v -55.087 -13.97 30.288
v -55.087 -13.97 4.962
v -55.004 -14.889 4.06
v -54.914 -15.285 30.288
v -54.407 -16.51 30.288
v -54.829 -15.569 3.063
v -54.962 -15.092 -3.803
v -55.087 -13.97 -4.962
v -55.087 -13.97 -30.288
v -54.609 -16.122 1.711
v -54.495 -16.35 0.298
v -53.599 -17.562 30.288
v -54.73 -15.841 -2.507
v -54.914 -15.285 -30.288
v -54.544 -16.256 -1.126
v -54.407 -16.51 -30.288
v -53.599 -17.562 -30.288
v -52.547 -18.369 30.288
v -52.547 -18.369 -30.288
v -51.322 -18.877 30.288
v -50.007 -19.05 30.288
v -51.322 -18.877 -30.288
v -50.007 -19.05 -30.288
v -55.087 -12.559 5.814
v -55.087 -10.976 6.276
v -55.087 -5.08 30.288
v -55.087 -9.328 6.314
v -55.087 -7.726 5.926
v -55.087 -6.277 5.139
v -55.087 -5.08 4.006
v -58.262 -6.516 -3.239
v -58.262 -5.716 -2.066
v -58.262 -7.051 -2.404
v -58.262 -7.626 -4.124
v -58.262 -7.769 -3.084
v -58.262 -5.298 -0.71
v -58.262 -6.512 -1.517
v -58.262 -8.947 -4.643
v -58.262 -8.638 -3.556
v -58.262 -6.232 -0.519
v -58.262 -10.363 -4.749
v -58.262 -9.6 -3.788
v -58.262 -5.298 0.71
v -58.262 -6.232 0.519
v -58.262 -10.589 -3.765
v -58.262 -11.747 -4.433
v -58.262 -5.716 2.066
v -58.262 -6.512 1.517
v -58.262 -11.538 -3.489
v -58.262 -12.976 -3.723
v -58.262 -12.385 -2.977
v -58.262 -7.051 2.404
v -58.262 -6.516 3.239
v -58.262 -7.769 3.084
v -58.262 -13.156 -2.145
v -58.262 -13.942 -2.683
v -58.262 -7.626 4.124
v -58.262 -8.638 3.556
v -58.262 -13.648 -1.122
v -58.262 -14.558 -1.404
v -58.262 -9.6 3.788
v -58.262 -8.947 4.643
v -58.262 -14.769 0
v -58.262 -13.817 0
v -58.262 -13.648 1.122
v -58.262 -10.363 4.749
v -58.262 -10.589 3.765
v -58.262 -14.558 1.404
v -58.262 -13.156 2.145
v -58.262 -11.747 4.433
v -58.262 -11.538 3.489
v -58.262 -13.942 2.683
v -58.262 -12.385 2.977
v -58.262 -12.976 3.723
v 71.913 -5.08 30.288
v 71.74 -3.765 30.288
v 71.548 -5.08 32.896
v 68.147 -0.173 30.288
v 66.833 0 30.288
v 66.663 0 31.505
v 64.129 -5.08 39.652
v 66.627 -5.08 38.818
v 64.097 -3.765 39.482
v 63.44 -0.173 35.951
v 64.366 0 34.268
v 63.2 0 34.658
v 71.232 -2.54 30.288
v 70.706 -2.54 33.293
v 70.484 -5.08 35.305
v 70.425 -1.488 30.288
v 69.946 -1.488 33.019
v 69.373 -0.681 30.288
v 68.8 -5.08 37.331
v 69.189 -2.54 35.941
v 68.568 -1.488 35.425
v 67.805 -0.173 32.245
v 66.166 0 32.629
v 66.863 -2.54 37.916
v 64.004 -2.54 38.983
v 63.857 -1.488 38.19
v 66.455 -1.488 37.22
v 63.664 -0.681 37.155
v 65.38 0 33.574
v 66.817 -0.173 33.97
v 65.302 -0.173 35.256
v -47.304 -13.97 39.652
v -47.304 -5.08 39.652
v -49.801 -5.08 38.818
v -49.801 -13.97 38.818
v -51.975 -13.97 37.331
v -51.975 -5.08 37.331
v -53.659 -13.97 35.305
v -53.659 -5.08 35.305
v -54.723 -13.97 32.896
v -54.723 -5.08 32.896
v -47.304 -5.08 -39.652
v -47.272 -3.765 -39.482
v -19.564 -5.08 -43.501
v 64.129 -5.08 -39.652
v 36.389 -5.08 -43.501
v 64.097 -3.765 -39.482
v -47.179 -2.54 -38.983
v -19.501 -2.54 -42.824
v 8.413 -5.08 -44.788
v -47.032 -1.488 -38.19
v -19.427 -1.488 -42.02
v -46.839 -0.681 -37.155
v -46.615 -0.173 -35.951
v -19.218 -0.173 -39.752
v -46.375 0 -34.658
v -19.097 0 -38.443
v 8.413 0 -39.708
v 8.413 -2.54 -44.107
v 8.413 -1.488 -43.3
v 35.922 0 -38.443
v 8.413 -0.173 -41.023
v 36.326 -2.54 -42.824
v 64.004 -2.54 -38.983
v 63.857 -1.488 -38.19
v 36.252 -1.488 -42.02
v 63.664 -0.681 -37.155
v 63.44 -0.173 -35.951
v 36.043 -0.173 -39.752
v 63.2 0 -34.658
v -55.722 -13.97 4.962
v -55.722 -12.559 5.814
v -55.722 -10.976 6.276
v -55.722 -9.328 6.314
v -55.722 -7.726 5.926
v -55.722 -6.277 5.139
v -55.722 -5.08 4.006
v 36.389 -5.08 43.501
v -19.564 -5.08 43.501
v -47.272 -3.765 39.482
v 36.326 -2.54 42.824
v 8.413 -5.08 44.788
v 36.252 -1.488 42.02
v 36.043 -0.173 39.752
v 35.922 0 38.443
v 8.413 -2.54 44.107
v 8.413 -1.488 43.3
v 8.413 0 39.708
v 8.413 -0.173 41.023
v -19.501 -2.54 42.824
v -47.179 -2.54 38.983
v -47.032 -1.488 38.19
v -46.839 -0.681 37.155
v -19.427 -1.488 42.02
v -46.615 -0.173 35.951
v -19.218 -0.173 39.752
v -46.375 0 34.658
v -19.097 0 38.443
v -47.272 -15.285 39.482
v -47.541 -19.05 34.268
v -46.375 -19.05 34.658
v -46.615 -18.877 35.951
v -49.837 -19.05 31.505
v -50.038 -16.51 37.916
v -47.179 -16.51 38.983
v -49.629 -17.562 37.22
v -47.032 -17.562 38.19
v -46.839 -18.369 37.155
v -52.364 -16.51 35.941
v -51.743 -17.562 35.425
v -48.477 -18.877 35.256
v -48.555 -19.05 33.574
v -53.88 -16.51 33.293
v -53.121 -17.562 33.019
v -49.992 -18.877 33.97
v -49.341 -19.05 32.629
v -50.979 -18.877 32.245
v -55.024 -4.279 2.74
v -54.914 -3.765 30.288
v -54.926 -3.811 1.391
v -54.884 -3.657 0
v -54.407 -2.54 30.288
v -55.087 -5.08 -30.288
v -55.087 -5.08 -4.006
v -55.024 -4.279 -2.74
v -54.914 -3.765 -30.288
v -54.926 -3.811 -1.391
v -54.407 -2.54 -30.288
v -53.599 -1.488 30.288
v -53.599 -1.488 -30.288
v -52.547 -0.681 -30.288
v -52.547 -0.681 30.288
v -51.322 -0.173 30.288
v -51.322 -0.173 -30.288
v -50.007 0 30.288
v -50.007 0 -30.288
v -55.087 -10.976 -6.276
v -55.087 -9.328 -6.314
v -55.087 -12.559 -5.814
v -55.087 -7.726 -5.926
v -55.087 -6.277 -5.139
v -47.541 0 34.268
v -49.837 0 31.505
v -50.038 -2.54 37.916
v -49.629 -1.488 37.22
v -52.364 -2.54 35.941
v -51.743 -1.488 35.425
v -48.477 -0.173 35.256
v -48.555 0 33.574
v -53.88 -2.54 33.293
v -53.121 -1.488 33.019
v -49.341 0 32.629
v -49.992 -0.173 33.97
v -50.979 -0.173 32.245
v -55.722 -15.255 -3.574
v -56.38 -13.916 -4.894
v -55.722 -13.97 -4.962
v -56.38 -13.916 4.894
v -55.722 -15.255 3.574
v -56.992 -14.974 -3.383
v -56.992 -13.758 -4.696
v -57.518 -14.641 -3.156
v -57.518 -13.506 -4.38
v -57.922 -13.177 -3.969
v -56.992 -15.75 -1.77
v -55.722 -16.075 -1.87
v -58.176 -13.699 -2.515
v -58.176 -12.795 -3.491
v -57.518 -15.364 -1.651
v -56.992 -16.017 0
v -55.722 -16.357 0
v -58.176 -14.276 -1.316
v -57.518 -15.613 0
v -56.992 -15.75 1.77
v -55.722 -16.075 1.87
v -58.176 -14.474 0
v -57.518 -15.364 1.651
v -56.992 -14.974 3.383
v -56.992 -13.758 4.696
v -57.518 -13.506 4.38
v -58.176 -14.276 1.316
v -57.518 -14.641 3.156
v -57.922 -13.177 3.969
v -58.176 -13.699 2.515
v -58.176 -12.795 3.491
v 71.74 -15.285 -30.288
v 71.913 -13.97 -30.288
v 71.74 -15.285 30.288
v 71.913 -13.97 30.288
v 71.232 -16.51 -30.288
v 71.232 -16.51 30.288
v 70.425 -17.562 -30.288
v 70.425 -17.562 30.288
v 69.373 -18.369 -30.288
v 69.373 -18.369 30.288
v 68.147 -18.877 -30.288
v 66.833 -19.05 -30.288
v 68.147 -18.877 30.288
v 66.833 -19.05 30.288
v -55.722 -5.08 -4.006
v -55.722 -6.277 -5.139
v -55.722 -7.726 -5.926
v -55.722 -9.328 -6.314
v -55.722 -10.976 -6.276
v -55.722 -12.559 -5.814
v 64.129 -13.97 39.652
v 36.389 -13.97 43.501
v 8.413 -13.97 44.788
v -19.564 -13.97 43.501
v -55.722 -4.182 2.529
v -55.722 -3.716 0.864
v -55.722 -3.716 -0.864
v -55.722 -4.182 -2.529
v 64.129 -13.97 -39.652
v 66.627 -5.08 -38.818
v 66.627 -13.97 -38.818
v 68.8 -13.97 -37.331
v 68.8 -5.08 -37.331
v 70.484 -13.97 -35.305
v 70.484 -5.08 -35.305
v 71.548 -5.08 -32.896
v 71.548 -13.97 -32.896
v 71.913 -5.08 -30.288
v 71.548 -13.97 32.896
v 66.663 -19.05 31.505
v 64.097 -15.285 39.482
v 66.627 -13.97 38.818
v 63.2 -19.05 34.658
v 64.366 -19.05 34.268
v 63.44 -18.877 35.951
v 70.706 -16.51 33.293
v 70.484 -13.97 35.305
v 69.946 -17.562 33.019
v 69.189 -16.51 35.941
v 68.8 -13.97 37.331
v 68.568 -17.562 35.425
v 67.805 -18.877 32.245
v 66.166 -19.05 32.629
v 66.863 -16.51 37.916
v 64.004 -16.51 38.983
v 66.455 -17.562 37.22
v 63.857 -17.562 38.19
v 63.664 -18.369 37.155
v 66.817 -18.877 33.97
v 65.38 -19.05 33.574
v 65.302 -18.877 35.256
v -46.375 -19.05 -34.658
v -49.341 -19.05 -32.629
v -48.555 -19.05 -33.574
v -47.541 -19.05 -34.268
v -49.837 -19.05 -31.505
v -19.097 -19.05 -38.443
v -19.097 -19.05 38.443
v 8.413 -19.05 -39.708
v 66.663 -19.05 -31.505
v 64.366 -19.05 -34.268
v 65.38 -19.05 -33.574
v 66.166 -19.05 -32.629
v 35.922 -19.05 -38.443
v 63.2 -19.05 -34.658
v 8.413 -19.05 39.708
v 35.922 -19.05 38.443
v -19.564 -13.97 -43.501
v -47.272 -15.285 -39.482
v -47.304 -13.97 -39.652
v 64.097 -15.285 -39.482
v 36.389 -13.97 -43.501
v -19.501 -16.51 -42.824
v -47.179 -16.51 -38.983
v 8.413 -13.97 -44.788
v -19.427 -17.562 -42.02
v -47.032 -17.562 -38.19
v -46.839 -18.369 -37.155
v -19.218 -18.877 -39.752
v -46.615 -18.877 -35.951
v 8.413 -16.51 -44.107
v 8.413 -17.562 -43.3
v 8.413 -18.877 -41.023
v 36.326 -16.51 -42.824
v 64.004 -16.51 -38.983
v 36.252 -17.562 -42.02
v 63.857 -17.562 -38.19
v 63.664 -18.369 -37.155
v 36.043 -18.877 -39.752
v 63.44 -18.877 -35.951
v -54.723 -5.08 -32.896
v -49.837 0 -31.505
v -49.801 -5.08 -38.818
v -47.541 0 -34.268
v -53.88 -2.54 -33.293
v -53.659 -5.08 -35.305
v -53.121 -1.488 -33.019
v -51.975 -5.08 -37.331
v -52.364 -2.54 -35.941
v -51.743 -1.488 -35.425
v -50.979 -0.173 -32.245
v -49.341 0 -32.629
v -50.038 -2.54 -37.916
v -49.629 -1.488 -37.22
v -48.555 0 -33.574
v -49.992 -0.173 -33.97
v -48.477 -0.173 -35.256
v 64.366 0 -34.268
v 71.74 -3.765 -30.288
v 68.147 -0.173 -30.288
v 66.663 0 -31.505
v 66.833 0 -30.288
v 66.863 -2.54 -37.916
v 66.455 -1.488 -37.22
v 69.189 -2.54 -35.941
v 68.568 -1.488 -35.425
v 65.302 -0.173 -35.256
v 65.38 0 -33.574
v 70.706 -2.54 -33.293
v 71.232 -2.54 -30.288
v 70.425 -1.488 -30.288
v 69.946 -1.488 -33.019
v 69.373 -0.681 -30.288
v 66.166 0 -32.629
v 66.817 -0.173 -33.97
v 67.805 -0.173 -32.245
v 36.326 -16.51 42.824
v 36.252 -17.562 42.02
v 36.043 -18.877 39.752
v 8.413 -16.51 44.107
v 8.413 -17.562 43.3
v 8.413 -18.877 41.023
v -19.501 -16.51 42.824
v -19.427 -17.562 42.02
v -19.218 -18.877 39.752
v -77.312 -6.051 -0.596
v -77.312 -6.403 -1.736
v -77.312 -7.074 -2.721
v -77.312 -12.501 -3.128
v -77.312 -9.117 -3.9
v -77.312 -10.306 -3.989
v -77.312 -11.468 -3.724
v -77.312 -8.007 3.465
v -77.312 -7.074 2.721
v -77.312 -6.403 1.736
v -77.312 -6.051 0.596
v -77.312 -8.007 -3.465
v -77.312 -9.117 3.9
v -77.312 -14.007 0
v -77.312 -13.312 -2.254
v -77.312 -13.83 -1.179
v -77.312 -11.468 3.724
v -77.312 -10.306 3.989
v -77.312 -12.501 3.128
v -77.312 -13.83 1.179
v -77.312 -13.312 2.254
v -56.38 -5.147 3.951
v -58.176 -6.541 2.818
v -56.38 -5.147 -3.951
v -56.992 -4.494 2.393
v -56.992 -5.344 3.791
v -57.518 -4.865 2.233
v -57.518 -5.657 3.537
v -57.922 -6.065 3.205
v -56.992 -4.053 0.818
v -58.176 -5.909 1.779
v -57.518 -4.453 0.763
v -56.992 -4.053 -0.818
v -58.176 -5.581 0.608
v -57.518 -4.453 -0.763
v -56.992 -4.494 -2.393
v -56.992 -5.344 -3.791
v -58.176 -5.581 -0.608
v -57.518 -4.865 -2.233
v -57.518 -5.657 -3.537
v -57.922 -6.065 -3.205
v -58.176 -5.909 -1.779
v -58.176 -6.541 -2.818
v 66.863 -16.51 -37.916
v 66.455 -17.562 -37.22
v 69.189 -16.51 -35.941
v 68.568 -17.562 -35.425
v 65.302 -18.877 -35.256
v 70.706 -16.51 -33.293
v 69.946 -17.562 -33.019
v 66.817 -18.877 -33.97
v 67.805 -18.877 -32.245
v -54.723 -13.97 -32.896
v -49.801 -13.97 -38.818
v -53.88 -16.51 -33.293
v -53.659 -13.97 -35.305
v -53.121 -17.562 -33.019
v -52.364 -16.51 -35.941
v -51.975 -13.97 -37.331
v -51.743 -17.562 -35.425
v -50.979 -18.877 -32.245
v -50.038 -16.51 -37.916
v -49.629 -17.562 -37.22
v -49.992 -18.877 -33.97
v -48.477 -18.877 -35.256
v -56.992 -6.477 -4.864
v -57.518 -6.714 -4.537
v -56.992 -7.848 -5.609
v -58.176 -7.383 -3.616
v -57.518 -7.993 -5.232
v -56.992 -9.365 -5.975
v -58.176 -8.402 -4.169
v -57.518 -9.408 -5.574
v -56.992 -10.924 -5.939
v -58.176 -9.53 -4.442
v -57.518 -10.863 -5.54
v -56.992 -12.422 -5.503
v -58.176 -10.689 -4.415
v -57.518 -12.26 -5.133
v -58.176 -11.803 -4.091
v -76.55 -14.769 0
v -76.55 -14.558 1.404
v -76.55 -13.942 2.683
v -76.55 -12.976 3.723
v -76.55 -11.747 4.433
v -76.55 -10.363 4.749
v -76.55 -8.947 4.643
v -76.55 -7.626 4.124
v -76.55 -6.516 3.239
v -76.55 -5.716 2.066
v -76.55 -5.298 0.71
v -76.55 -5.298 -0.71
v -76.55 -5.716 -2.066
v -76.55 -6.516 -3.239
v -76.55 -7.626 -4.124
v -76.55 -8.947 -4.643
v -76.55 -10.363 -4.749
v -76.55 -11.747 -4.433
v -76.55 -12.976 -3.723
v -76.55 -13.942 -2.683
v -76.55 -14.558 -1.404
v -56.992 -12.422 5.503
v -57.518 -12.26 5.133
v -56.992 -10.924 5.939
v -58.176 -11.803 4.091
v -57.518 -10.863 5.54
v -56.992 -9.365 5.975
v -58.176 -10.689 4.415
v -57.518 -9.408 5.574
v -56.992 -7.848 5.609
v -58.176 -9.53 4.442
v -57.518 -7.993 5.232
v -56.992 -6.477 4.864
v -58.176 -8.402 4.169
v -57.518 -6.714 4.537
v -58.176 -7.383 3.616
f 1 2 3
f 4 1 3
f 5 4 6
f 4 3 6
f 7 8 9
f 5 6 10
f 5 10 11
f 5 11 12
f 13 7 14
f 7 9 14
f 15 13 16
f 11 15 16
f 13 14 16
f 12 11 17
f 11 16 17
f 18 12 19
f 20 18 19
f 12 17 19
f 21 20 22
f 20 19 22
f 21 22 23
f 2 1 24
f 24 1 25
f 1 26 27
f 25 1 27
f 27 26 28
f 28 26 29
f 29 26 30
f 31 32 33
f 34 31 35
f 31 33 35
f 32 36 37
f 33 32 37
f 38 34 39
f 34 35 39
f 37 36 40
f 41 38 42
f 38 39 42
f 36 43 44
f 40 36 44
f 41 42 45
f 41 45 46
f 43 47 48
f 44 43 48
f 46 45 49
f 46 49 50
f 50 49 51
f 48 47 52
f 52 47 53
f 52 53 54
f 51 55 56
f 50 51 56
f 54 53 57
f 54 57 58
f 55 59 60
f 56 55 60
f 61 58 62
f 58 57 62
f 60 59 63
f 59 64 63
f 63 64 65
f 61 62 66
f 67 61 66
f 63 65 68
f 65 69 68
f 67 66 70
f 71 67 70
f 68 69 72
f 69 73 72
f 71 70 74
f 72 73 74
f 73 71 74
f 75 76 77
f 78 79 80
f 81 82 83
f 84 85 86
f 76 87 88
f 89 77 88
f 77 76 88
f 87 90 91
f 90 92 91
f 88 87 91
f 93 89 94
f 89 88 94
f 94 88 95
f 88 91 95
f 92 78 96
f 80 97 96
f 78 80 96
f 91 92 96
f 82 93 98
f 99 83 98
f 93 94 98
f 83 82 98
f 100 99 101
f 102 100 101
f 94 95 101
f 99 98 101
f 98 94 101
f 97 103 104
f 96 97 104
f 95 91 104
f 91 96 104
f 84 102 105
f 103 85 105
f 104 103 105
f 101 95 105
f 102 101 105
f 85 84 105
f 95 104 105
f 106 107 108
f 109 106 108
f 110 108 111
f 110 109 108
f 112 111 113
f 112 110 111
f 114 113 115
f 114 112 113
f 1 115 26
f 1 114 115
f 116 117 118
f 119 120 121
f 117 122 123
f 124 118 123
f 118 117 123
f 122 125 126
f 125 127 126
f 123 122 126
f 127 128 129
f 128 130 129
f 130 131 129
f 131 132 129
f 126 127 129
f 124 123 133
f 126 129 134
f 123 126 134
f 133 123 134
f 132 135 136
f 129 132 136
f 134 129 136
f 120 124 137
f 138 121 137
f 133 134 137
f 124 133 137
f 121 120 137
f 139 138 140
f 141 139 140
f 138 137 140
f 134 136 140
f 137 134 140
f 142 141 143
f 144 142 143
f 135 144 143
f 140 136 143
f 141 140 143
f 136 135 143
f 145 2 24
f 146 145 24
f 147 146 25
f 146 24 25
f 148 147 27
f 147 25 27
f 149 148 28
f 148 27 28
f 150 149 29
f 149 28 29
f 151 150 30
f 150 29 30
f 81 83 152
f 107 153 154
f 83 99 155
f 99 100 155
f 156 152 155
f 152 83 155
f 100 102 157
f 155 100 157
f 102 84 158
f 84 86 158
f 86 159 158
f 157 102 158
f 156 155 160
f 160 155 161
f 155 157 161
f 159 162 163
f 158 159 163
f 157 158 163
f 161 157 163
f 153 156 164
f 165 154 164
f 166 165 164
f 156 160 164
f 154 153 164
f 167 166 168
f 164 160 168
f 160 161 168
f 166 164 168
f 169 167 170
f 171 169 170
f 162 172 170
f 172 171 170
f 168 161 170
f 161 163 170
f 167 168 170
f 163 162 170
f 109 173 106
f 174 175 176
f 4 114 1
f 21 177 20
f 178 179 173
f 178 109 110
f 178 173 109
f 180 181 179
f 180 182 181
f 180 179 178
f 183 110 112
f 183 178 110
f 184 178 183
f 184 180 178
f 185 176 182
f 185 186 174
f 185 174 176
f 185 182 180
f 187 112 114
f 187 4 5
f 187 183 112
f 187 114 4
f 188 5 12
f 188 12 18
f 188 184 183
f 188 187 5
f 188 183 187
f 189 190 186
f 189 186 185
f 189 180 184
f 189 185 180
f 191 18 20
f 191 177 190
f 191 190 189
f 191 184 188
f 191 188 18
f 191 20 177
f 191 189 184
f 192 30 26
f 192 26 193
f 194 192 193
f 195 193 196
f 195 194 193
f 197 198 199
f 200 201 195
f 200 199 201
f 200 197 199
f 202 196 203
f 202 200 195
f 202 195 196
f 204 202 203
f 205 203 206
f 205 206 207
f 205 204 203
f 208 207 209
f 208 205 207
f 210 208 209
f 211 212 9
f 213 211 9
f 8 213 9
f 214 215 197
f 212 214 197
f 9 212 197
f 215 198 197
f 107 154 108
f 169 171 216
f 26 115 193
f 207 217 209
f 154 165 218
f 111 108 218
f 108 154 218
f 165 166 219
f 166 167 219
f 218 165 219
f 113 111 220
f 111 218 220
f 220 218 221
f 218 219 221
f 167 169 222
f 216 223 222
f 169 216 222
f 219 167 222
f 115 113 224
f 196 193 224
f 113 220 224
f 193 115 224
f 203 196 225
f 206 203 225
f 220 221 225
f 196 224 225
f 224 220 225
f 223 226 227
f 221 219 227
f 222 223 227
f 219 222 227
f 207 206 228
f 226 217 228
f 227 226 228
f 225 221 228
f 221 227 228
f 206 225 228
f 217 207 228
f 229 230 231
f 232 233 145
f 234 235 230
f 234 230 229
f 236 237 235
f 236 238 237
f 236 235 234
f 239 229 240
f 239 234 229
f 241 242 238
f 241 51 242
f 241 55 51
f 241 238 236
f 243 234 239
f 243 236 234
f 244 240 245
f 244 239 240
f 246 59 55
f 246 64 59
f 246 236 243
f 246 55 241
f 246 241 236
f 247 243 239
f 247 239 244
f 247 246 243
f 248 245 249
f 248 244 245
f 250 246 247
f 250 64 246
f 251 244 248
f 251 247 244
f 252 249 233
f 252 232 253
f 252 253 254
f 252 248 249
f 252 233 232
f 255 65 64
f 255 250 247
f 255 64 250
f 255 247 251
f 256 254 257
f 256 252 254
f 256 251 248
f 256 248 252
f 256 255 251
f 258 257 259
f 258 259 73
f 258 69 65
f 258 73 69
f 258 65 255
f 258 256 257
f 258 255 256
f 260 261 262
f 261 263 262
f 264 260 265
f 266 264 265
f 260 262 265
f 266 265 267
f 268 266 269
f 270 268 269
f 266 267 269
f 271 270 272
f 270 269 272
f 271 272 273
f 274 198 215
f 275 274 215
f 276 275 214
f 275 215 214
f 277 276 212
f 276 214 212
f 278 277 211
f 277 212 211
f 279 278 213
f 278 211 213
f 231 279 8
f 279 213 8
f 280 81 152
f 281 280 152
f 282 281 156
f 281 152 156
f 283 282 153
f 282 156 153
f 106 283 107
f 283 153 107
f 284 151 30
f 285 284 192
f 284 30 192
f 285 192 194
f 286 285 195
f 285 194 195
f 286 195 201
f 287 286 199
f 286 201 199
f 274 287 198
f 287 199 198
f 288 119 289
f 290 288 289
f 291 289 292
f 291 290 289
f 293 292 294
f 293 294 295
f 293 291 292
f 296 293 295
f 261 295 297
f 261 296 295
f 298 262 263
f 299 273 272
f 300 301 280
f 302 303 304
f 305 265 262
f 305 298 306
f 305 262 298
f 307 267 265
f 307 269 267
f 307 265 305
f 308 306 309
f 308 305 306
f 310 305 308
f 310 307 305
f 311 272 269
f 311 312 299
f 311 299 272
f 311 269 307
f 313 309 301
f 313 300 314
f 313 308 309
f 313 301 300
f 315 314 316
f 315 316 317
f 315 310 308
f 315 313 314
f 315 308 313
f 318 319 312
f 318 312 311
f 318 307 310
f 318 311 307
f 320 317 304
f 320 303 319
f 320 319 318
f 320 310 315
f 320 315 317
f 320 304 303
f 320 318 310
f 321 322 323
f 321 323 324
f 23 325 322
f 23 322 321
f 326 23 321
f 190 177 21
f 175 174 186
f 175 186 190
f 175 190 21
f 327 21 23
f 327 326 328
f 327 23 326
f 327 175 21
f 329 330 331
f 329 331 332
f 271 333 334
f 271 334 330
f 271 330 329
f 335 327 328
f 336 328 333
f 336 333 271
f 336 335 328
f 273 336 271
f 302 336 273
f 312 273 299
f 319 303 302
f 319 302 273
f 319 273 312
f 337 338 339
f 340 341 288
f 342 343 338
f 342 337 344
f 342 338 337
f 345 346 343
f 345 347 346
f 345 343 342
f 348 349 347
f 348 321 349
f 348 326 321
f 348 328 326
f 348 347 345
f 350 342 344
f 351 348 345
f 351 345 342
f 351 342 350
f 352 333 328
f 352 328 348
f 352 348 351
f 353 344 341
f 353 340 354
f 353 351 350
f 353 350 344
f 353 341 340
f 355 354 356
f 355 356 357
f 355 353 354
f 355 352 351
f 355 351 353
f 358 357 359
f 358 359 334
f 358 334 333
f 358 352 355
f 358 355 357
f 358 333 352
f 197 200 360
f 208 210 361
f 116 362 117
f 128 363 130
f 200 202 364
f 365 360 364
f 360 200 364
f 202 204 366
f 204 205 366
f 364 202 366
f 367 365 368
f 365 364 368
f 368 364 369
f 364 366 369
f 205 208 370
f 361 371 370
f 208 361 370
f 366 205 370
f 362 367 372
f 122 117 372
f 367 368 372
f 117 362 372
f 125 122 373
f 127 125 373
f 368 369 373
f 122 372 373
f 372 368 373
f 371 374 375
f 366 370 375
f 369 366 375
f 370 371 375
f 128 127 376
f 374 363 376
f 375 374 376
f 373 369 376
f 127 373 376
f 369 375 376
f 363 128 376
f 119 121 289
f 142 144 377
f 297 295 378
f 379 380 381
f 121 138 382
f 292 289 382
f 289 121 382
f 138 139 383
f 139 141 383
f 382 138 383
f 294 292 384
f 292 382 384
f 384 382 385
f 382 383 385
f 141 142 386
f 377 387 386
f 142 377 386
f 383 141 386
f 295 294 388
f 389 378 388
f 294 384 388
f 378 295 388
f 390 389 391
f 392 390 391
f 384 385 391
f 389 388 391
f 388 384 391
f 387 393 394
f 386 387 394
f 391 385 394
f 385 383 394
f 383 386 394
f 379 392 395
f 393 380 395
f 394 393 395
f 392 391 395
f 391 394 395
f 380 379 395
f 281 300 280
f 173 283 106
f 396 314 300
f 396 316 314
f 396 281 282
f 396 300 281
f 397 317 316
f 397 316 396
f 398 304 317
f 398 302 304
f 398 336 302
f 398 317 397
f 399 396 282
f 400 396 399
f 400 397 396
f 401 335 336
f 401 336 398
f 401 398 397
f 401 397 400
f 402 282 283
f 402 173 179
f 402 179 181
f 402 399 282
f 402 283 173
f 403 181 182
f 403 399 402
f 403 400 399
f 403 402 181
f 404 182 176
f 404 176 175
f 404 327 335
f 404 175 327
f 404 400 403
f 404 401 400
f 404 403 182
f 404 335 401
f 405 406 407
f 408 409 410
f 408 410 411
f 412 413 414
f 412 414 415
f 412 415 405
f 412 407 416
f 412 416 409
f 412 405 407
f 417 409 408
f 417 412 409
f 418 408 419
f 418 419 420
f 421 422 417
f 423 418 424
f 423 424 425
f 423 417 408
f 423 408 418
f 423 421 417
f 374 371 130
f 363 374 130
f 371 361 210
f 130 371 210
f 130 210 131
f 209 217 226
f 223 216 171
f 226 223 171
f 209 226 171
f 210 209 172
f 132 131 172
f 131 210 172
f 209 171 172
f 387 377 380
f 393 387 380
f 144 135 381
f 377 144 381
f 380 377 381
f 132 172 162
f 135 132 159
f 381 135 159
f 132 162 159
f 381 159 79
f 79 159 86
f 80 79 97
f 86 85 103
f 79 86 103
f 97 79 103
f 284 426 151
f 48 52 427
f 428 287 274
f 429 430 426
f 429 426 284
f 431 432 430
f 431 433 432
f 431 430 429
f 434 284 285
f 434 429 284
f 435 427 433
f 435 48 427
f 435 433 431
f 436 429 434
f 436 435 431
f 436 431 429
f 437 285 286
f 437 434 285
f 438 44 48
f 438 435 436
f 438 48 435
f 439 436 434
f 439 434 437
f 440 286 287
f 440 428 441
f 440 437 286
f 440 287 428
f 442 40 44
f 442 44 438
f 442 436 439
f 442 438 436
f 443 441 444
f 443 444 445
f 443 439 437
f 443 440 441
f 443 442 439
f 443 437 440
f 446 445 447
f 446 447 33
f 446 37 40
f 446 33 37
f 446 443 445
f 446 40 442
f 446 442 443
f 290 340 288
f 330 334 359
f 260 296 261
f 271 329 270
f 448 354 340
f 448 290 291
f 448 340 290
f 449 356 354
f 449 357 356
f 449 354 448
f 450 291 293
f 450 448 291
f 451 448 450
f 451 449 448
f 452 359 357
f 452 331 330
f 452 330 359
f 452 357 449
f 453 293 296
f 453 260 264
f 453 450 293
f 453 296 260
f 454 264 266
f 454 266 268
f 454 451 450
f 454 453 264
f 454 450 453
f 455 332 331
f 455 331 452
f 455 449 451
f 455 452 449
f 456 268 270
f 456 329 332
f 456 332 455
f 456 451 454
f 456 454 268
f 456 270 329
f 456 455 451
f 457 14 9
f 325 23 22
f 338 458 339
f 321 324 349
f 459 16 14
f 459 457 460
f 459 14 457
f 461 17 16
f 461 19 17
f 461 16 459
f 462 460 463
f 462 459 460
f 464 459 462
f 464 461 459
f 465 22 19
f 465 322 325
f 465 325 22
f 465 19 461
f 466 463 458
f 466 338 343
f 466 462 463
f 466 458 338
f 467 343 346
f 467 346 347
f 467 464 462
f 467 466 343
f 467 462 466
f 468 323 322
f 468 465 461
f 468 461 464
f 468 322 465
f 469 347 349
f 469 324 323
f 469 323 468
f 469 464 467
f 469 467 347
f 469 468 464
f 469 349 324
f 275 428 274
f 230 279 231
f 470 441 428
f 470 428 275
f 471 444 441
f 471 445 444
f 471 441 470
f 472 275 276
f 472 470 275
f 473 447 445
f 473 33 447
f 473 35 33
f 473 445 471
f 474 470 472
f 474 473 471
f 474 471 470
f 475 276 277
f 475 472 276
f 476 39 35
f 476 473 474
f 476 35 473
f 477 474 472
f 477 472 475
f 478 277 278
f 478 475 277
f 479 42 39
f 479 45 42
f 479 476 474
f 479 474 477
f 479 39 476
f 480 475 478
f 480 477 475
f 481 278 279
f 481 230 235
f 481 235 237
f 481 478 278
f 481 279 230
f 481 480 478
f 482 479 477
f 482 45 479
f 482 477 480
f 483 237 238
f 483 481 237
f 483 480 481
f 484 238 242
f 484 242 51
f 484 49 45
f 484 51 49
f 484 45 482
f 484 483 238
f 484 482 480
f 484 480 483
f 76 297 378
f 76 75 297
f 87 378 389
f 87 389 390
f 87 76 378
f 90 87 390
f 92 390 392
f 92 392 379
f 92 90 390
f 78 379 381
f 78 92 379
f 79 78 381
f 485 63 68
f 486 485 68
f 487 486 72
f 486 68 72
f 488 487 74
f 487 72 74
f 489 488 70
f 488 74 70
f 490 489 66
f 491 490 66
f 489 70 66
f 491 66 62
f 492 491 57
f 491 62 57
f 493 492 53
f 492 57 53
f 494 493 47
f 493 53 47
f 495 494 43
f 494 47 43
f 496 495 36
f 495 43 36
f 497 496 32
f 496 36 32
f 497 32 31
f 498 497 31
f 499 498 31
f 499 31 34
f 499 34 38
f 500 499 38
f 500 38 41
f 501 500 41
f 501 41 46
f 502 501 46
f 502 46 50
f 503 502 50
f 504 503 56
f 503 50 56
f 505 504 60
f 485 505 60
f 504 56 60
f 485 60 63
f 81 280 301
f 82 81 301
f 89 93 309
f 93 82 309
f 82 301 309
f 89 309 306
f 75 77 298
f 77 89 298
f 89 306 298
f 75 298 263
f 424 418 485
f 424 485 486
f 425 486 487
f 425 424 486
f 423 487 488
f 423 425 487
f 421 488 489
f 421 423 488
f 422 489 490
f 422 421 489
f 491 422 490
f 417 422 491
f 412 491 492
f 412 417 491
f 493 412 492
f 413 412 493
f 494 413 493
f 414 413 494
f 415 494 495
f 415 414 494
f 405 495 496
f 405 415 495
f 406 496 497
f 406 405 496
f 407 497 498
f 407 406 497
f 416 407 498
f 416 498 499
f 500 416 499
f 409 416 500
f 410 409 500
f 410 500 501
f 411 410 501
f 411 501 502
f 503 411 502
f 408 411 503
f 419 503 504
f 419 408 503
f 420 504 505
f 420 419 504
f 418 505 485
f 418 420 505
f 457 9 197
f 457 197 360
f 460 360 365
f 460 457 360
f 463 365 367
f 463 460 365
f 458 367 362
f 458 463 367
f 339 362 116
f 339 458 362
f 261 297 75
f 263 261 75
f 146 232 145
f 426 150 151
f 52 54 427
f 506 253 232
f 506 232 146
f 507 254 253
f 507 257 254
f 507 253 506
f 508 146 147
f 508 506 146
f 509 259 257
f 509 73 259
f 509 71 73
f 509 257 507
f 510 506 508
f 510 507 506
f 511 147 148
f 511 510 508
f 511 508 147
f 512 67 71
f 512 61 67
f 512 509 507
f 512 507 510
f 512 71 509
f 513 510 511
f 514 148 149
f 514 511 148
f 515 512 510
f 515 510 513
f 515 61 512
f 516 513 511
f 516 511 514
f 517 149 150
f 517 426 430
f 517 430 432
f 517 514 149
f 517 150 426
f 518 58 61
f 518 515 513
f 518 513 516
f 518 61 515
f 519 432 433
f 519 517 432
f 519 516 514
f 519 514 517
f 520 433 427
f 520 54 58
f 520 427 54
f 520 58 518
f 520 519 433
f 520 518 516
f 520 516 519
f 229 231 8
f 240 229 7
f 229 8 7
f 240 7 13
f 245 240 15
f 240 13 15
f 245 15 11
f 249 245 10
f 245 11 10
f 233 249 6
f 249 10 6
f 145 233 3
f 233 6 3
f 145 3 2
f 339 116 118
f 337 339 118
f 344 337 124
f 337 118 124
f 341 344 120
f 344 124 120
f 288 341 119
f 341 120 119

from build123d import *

# Parameters (mm, degrees)
F1_DEPTH      = 19.05
F2_R          = 9.525
F3_R          = 5.08
F5_DEPTH      = 3.175
F5_DEPTH_BACK = 5.08
F6_R          = 2.54
F7_R          = 4.7625
F8_DEPTH      = 19.05
F9_SIZE       = 0.762


with BuildPart() as f1:
    # F0 (on Front) → F1 (new body)
    with BuildSketch(Plane.XZ):
        with BuildLine():
            Line((71.9126091726, 0), (71.9126091726, 38.1))
            ThreePointArc((71.9126091726, 38.1), (8.4126091726, 44.7879573046), (-55.0873908274, 38.1))
            Line((-55.0873908274, 38.1), (-55.0873908274, 0))
            Line((-55.0873908274, 0), (-55.0873908274, -38.1))
            ThreePointArc((-55.0873908274, -38.1), (8.4126091726, -44.7879573046), (71.9126091726, -38.1))
            Line((71.9126091726, -38.1), (71.9126091726, 0))
        make_face()
    extrude(amount=F1_DEPTH)

    # F2
    f2_edges = [f1.edges().sort_by_distance(p)[0] for p in [
        (-55.087391, -9.525, 38.1),
        (-55.087391, -9.525, -38.1),
        (71.912609, -9.525, 38.1),
        (71.912609, -9.525, -38.1),
    ]]
    fillet(f2_edges, radius=F2_R)

    # F3
    f3_edges = [f1.edges().sort_by_distance(p)[0] for p in [
        (8.412609, -19.05, 44.787957),
        (8.412609, 0, 44.787957),
    ]]
    fillet(f3_edges, radius=F3_R)

    # F4 (on face) → F5 (join, two sides)
    with BuildSketch(Plane(origin=(-55.0873908274, 0, 0), x_dir=(0, -1, 0), z_dir=(-1, 0, 0))) as f5_sk:
        with BuildLine():
            ThreePointArc((13.97, -4.9615211664), (15.7291776693, -2.7529165008), (16.3569446489, 0))
            ThreePointArc((16.3569446489, 0), (15.7291776693, 2.7529165008), (13.97, 4.9615211664))
            Line((13.97, 4.9615211664), (13.97, -4.9615211664))
        make_face()
        with BuildLine():
            Line((5.08, -4.0059601129), (5.08, 4.0059601129))
            ThreePointArc((5.08, 4.0059601129), (3.6569446489, 0), (5.08, -4.0059601129))
        make_face()
        with BuildLine():
            Line((13.97, -4.9615211664), (13.97, 4.9615211664))
            ThreePointArc((13.97, 4.9615211664), (9.3283100813, 6.3136324825), (5.08, 4.0059601129))
            Line((5.08, 4.0059601129), (5.08, -4.0059601129))
            ThreePointArc((5.08, -4.0059601129), (9.3283100813, -6.3136324825), (13.97, -4.9615211664))
        make_face()
    extrude(amount=F5_DEPTH)
    extrude(f5_sk.sketch, amount=-F5_DEPTH_BACK)

    # F6
    f6_edges = [f1.edges().sort_by_distance(p)[0] for p in [
        (-58.262391, -6.043889, -4.961521),
    ]]
    fillet(f6_edges, radius=F6_R)

    # F7 (on face) → F8 (join)
    with BuildSketch(Plane(origin=(-58.2623908274, 0, 0), x_dir=(0, -1, 0), z_dir=(-1, 0, 0))):
        with Locations((10.0069446489, 0)):
            Circle(F7_R)
    extrude(amount=F8_DEPTH)

    # F9
    f9_edges = [f1.edges().sort_by_distance(p)[0] for p in [
        (-77.312391, -5.244445, 0),
    ]]
    chamfer(f9_edges, length=F9_SIZE)


solid = f1.part
